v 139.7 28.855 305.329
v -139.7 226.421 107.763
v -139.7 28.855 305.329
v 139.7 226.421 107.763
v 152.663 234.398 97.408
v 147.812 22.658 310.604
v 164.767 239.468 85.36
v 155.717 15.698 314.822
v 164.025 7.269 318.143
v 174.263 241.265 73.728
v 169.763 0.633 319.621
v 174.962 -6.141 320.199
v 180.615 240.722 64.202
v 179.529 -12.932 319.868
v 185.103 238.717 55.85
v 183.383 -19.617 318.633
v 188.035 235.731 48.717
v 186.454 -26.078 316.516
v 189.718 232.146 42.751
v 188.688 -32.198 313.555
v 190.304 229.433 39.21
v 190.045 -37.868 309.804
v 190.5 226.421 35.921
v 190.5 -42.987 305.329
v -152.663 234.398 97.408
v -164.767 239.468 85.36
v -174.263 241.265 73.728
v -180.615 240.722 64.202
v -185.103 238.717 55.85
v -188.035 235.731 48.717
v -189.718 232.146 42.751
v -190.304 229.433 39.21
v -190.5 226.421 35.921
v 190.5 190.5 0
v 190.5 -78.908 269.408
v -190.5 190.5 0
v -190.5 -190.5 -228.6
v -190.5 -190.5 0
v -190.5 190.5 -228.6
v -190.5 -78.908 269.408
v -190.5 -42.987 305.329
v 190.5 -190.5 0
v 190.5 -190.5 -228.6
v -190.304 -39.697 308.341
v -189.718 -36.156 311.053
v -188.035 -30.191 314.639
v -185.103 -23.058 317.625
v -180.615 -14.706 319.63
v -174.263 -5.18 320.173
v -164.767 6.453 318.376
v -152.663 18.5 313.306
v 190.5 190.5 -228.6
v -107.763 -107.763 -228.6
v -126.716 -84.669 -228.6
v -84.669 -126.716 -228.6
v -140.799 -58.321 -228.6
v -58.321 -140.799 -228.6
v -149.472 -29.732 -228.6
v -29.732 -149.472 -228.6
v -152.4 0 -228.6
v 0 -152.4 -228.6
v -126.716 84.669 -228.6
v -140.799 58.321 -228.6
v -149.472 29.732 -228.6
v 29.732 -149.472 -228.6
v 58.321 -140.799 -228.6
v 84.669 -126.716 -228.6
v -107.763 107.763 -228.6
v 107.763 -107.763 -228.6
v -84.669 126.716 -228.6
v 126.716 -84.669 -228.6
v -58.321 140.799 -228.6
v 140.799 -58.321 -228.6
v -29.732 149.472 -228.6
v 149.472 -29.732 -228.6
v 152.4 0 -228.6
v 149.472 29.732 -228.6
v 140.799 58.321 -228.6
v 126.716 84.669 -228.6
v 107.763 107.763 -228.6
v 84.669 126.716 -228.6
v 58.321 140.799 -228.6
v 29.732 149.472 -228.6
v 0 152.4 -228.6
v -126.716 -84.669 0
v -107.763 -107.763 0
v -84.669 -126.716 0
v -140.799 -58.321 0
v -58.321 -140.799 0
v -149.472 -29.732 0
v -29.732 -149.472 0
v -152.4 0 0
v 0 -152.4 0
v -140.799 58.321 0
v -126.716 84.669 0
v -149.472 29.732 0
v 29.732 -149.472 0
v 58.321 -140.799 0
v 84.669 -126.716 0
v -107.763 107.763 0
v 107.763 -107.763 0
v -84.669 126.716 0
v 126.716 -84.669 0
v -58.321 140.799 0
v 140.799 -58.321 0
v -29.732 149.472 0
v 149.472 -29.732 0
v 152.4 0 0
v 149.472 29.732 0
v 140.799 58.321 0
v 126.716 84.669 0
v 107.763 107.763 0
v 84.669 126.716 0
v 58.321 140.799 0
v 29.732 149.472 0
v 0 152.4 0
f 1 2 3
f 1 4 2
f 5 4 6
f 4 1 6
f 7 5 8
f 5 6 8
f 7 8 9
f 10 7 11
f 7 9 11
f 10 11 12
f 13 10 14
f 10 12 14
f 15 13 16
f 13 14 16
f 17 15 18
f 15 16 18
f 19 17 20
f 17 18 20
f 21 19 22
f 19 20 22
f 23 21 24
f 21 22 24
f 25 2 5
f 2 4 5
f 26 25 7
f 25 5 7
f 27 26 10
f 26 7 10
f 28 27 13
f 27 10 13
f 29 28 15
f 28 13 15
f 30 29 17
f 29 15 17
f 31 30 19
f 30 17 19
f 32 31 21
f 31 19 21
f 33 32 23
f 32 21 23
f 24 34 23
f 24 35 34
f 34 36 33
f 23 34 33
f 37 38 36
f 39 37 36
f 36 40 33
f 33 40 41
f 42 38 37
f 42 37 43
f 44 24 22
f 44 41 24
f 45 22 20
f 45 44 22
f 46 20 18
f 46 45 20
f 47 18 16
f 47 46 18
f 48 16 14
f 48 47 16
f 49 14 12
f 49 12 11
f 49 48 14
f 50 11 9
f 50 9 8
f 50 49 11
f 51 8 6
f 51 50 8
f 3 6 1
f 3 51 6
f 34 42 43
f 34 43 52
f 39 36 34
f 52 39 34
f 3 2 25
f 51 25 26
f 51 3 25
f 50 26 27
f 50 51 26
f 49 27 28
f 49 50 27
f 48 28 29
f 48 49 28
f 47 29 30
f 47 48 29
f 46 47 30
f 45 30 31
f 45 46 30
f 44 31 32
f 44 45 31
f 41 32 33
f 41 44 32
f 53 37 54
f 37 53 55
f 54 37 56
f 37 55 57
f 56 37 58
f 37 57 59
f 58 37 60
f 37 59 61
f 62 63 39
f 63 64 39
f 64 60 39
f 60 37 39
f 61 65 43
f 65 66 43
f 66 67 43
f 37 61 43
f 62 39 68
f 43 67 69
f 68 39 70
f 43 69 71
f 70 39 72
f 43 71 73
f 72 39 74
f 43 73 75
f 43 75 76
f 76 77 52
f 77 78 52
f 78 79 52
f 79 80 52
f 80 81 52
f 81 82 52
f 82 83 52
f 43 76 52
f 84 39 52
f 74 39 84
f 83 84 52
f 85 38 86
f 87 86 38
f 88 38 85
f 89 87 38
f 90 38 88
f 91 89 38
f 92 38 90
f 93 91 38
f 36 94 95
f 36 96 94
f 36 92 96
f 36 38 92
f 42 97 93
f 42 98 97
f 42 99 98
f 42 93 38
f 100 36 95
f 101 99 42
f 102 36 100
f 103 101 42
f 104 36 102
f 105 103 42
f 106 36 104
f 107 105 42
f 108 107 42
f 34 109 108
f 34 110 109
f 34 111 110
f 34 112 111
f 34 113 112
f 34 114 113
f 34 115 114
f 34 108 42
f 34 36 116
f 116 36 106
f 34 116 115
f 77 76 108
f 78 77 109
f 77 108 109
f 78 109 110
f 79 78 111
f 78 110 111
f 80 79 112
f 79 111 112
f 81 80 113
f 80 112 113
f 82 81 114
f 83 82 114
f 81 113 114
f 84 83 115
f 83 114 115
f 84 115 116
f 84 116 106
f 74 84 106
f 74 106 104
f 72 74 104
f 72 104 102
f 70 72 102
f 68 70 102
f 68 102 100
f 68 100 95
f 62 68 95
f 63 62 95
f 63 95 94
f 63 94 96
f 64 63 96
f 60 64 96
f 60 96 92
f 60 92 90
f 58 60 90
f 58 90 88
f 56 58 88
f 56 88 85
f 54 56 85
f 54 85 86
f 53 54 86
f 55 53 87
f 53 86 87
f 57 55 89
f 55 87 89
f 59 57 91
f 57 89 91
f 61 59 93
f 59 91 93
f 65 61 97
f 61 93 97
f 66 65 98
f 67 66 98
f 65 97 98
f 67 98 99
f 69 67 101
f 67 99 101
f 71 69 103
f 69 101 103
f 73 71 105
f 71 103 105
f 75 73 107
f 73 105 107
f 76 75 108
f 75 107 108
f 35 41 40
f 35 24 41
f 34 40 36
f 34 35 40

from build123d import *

# Parameters (mm, degrees)
F0_W     = 381
F0_H     = 381
F1_DEPTH = 228.6
F4_DEPTH = 190.5
F5_R     = 50.8
F6_R     = 152.4
F7_DEPTH = 228.601


with BuildPart() as f1:
    # F0 (on Top) → F1 (new body)
    with BuildSketch(Plane.XY):
        Rectangle(F0_W, F0_H)
    extrude(amount=-F1_DEPTH)

    # F6 (on face) → F7 (cut, through all)
    with BuildSketch(Plane.XY):
        Circle(F6_R)
    extrude(amount=-F7_DEPTH, mode=Mode.SUBTRACT)


with BuildPart() as f4:
    # F3 (on Right) → F4 (new body, symmetric)
    with BuildSketch(Plane.YZ):
        Polygon((-78.907684, 269.407684), (190.5, 0), (262.342049, 71.842049), (-7.065635, 341.249733), align=None)
    extrude(amount=F4_DEPTH, both=True)

    # F5
    f5_edges = [f4.edges().sort_by_distance(p)[0] for p in [
        (-190.5, 127.638207, 206.545891),
        (0, -7.065635, 341.249733),
        (190.5, 127.638207, 206.545891),
        (0, 262.342049, 71.842049),
    ]]
    fillet(f5_edges, radius=F5_R)


solid = Compound([f1.part, f4.part])
